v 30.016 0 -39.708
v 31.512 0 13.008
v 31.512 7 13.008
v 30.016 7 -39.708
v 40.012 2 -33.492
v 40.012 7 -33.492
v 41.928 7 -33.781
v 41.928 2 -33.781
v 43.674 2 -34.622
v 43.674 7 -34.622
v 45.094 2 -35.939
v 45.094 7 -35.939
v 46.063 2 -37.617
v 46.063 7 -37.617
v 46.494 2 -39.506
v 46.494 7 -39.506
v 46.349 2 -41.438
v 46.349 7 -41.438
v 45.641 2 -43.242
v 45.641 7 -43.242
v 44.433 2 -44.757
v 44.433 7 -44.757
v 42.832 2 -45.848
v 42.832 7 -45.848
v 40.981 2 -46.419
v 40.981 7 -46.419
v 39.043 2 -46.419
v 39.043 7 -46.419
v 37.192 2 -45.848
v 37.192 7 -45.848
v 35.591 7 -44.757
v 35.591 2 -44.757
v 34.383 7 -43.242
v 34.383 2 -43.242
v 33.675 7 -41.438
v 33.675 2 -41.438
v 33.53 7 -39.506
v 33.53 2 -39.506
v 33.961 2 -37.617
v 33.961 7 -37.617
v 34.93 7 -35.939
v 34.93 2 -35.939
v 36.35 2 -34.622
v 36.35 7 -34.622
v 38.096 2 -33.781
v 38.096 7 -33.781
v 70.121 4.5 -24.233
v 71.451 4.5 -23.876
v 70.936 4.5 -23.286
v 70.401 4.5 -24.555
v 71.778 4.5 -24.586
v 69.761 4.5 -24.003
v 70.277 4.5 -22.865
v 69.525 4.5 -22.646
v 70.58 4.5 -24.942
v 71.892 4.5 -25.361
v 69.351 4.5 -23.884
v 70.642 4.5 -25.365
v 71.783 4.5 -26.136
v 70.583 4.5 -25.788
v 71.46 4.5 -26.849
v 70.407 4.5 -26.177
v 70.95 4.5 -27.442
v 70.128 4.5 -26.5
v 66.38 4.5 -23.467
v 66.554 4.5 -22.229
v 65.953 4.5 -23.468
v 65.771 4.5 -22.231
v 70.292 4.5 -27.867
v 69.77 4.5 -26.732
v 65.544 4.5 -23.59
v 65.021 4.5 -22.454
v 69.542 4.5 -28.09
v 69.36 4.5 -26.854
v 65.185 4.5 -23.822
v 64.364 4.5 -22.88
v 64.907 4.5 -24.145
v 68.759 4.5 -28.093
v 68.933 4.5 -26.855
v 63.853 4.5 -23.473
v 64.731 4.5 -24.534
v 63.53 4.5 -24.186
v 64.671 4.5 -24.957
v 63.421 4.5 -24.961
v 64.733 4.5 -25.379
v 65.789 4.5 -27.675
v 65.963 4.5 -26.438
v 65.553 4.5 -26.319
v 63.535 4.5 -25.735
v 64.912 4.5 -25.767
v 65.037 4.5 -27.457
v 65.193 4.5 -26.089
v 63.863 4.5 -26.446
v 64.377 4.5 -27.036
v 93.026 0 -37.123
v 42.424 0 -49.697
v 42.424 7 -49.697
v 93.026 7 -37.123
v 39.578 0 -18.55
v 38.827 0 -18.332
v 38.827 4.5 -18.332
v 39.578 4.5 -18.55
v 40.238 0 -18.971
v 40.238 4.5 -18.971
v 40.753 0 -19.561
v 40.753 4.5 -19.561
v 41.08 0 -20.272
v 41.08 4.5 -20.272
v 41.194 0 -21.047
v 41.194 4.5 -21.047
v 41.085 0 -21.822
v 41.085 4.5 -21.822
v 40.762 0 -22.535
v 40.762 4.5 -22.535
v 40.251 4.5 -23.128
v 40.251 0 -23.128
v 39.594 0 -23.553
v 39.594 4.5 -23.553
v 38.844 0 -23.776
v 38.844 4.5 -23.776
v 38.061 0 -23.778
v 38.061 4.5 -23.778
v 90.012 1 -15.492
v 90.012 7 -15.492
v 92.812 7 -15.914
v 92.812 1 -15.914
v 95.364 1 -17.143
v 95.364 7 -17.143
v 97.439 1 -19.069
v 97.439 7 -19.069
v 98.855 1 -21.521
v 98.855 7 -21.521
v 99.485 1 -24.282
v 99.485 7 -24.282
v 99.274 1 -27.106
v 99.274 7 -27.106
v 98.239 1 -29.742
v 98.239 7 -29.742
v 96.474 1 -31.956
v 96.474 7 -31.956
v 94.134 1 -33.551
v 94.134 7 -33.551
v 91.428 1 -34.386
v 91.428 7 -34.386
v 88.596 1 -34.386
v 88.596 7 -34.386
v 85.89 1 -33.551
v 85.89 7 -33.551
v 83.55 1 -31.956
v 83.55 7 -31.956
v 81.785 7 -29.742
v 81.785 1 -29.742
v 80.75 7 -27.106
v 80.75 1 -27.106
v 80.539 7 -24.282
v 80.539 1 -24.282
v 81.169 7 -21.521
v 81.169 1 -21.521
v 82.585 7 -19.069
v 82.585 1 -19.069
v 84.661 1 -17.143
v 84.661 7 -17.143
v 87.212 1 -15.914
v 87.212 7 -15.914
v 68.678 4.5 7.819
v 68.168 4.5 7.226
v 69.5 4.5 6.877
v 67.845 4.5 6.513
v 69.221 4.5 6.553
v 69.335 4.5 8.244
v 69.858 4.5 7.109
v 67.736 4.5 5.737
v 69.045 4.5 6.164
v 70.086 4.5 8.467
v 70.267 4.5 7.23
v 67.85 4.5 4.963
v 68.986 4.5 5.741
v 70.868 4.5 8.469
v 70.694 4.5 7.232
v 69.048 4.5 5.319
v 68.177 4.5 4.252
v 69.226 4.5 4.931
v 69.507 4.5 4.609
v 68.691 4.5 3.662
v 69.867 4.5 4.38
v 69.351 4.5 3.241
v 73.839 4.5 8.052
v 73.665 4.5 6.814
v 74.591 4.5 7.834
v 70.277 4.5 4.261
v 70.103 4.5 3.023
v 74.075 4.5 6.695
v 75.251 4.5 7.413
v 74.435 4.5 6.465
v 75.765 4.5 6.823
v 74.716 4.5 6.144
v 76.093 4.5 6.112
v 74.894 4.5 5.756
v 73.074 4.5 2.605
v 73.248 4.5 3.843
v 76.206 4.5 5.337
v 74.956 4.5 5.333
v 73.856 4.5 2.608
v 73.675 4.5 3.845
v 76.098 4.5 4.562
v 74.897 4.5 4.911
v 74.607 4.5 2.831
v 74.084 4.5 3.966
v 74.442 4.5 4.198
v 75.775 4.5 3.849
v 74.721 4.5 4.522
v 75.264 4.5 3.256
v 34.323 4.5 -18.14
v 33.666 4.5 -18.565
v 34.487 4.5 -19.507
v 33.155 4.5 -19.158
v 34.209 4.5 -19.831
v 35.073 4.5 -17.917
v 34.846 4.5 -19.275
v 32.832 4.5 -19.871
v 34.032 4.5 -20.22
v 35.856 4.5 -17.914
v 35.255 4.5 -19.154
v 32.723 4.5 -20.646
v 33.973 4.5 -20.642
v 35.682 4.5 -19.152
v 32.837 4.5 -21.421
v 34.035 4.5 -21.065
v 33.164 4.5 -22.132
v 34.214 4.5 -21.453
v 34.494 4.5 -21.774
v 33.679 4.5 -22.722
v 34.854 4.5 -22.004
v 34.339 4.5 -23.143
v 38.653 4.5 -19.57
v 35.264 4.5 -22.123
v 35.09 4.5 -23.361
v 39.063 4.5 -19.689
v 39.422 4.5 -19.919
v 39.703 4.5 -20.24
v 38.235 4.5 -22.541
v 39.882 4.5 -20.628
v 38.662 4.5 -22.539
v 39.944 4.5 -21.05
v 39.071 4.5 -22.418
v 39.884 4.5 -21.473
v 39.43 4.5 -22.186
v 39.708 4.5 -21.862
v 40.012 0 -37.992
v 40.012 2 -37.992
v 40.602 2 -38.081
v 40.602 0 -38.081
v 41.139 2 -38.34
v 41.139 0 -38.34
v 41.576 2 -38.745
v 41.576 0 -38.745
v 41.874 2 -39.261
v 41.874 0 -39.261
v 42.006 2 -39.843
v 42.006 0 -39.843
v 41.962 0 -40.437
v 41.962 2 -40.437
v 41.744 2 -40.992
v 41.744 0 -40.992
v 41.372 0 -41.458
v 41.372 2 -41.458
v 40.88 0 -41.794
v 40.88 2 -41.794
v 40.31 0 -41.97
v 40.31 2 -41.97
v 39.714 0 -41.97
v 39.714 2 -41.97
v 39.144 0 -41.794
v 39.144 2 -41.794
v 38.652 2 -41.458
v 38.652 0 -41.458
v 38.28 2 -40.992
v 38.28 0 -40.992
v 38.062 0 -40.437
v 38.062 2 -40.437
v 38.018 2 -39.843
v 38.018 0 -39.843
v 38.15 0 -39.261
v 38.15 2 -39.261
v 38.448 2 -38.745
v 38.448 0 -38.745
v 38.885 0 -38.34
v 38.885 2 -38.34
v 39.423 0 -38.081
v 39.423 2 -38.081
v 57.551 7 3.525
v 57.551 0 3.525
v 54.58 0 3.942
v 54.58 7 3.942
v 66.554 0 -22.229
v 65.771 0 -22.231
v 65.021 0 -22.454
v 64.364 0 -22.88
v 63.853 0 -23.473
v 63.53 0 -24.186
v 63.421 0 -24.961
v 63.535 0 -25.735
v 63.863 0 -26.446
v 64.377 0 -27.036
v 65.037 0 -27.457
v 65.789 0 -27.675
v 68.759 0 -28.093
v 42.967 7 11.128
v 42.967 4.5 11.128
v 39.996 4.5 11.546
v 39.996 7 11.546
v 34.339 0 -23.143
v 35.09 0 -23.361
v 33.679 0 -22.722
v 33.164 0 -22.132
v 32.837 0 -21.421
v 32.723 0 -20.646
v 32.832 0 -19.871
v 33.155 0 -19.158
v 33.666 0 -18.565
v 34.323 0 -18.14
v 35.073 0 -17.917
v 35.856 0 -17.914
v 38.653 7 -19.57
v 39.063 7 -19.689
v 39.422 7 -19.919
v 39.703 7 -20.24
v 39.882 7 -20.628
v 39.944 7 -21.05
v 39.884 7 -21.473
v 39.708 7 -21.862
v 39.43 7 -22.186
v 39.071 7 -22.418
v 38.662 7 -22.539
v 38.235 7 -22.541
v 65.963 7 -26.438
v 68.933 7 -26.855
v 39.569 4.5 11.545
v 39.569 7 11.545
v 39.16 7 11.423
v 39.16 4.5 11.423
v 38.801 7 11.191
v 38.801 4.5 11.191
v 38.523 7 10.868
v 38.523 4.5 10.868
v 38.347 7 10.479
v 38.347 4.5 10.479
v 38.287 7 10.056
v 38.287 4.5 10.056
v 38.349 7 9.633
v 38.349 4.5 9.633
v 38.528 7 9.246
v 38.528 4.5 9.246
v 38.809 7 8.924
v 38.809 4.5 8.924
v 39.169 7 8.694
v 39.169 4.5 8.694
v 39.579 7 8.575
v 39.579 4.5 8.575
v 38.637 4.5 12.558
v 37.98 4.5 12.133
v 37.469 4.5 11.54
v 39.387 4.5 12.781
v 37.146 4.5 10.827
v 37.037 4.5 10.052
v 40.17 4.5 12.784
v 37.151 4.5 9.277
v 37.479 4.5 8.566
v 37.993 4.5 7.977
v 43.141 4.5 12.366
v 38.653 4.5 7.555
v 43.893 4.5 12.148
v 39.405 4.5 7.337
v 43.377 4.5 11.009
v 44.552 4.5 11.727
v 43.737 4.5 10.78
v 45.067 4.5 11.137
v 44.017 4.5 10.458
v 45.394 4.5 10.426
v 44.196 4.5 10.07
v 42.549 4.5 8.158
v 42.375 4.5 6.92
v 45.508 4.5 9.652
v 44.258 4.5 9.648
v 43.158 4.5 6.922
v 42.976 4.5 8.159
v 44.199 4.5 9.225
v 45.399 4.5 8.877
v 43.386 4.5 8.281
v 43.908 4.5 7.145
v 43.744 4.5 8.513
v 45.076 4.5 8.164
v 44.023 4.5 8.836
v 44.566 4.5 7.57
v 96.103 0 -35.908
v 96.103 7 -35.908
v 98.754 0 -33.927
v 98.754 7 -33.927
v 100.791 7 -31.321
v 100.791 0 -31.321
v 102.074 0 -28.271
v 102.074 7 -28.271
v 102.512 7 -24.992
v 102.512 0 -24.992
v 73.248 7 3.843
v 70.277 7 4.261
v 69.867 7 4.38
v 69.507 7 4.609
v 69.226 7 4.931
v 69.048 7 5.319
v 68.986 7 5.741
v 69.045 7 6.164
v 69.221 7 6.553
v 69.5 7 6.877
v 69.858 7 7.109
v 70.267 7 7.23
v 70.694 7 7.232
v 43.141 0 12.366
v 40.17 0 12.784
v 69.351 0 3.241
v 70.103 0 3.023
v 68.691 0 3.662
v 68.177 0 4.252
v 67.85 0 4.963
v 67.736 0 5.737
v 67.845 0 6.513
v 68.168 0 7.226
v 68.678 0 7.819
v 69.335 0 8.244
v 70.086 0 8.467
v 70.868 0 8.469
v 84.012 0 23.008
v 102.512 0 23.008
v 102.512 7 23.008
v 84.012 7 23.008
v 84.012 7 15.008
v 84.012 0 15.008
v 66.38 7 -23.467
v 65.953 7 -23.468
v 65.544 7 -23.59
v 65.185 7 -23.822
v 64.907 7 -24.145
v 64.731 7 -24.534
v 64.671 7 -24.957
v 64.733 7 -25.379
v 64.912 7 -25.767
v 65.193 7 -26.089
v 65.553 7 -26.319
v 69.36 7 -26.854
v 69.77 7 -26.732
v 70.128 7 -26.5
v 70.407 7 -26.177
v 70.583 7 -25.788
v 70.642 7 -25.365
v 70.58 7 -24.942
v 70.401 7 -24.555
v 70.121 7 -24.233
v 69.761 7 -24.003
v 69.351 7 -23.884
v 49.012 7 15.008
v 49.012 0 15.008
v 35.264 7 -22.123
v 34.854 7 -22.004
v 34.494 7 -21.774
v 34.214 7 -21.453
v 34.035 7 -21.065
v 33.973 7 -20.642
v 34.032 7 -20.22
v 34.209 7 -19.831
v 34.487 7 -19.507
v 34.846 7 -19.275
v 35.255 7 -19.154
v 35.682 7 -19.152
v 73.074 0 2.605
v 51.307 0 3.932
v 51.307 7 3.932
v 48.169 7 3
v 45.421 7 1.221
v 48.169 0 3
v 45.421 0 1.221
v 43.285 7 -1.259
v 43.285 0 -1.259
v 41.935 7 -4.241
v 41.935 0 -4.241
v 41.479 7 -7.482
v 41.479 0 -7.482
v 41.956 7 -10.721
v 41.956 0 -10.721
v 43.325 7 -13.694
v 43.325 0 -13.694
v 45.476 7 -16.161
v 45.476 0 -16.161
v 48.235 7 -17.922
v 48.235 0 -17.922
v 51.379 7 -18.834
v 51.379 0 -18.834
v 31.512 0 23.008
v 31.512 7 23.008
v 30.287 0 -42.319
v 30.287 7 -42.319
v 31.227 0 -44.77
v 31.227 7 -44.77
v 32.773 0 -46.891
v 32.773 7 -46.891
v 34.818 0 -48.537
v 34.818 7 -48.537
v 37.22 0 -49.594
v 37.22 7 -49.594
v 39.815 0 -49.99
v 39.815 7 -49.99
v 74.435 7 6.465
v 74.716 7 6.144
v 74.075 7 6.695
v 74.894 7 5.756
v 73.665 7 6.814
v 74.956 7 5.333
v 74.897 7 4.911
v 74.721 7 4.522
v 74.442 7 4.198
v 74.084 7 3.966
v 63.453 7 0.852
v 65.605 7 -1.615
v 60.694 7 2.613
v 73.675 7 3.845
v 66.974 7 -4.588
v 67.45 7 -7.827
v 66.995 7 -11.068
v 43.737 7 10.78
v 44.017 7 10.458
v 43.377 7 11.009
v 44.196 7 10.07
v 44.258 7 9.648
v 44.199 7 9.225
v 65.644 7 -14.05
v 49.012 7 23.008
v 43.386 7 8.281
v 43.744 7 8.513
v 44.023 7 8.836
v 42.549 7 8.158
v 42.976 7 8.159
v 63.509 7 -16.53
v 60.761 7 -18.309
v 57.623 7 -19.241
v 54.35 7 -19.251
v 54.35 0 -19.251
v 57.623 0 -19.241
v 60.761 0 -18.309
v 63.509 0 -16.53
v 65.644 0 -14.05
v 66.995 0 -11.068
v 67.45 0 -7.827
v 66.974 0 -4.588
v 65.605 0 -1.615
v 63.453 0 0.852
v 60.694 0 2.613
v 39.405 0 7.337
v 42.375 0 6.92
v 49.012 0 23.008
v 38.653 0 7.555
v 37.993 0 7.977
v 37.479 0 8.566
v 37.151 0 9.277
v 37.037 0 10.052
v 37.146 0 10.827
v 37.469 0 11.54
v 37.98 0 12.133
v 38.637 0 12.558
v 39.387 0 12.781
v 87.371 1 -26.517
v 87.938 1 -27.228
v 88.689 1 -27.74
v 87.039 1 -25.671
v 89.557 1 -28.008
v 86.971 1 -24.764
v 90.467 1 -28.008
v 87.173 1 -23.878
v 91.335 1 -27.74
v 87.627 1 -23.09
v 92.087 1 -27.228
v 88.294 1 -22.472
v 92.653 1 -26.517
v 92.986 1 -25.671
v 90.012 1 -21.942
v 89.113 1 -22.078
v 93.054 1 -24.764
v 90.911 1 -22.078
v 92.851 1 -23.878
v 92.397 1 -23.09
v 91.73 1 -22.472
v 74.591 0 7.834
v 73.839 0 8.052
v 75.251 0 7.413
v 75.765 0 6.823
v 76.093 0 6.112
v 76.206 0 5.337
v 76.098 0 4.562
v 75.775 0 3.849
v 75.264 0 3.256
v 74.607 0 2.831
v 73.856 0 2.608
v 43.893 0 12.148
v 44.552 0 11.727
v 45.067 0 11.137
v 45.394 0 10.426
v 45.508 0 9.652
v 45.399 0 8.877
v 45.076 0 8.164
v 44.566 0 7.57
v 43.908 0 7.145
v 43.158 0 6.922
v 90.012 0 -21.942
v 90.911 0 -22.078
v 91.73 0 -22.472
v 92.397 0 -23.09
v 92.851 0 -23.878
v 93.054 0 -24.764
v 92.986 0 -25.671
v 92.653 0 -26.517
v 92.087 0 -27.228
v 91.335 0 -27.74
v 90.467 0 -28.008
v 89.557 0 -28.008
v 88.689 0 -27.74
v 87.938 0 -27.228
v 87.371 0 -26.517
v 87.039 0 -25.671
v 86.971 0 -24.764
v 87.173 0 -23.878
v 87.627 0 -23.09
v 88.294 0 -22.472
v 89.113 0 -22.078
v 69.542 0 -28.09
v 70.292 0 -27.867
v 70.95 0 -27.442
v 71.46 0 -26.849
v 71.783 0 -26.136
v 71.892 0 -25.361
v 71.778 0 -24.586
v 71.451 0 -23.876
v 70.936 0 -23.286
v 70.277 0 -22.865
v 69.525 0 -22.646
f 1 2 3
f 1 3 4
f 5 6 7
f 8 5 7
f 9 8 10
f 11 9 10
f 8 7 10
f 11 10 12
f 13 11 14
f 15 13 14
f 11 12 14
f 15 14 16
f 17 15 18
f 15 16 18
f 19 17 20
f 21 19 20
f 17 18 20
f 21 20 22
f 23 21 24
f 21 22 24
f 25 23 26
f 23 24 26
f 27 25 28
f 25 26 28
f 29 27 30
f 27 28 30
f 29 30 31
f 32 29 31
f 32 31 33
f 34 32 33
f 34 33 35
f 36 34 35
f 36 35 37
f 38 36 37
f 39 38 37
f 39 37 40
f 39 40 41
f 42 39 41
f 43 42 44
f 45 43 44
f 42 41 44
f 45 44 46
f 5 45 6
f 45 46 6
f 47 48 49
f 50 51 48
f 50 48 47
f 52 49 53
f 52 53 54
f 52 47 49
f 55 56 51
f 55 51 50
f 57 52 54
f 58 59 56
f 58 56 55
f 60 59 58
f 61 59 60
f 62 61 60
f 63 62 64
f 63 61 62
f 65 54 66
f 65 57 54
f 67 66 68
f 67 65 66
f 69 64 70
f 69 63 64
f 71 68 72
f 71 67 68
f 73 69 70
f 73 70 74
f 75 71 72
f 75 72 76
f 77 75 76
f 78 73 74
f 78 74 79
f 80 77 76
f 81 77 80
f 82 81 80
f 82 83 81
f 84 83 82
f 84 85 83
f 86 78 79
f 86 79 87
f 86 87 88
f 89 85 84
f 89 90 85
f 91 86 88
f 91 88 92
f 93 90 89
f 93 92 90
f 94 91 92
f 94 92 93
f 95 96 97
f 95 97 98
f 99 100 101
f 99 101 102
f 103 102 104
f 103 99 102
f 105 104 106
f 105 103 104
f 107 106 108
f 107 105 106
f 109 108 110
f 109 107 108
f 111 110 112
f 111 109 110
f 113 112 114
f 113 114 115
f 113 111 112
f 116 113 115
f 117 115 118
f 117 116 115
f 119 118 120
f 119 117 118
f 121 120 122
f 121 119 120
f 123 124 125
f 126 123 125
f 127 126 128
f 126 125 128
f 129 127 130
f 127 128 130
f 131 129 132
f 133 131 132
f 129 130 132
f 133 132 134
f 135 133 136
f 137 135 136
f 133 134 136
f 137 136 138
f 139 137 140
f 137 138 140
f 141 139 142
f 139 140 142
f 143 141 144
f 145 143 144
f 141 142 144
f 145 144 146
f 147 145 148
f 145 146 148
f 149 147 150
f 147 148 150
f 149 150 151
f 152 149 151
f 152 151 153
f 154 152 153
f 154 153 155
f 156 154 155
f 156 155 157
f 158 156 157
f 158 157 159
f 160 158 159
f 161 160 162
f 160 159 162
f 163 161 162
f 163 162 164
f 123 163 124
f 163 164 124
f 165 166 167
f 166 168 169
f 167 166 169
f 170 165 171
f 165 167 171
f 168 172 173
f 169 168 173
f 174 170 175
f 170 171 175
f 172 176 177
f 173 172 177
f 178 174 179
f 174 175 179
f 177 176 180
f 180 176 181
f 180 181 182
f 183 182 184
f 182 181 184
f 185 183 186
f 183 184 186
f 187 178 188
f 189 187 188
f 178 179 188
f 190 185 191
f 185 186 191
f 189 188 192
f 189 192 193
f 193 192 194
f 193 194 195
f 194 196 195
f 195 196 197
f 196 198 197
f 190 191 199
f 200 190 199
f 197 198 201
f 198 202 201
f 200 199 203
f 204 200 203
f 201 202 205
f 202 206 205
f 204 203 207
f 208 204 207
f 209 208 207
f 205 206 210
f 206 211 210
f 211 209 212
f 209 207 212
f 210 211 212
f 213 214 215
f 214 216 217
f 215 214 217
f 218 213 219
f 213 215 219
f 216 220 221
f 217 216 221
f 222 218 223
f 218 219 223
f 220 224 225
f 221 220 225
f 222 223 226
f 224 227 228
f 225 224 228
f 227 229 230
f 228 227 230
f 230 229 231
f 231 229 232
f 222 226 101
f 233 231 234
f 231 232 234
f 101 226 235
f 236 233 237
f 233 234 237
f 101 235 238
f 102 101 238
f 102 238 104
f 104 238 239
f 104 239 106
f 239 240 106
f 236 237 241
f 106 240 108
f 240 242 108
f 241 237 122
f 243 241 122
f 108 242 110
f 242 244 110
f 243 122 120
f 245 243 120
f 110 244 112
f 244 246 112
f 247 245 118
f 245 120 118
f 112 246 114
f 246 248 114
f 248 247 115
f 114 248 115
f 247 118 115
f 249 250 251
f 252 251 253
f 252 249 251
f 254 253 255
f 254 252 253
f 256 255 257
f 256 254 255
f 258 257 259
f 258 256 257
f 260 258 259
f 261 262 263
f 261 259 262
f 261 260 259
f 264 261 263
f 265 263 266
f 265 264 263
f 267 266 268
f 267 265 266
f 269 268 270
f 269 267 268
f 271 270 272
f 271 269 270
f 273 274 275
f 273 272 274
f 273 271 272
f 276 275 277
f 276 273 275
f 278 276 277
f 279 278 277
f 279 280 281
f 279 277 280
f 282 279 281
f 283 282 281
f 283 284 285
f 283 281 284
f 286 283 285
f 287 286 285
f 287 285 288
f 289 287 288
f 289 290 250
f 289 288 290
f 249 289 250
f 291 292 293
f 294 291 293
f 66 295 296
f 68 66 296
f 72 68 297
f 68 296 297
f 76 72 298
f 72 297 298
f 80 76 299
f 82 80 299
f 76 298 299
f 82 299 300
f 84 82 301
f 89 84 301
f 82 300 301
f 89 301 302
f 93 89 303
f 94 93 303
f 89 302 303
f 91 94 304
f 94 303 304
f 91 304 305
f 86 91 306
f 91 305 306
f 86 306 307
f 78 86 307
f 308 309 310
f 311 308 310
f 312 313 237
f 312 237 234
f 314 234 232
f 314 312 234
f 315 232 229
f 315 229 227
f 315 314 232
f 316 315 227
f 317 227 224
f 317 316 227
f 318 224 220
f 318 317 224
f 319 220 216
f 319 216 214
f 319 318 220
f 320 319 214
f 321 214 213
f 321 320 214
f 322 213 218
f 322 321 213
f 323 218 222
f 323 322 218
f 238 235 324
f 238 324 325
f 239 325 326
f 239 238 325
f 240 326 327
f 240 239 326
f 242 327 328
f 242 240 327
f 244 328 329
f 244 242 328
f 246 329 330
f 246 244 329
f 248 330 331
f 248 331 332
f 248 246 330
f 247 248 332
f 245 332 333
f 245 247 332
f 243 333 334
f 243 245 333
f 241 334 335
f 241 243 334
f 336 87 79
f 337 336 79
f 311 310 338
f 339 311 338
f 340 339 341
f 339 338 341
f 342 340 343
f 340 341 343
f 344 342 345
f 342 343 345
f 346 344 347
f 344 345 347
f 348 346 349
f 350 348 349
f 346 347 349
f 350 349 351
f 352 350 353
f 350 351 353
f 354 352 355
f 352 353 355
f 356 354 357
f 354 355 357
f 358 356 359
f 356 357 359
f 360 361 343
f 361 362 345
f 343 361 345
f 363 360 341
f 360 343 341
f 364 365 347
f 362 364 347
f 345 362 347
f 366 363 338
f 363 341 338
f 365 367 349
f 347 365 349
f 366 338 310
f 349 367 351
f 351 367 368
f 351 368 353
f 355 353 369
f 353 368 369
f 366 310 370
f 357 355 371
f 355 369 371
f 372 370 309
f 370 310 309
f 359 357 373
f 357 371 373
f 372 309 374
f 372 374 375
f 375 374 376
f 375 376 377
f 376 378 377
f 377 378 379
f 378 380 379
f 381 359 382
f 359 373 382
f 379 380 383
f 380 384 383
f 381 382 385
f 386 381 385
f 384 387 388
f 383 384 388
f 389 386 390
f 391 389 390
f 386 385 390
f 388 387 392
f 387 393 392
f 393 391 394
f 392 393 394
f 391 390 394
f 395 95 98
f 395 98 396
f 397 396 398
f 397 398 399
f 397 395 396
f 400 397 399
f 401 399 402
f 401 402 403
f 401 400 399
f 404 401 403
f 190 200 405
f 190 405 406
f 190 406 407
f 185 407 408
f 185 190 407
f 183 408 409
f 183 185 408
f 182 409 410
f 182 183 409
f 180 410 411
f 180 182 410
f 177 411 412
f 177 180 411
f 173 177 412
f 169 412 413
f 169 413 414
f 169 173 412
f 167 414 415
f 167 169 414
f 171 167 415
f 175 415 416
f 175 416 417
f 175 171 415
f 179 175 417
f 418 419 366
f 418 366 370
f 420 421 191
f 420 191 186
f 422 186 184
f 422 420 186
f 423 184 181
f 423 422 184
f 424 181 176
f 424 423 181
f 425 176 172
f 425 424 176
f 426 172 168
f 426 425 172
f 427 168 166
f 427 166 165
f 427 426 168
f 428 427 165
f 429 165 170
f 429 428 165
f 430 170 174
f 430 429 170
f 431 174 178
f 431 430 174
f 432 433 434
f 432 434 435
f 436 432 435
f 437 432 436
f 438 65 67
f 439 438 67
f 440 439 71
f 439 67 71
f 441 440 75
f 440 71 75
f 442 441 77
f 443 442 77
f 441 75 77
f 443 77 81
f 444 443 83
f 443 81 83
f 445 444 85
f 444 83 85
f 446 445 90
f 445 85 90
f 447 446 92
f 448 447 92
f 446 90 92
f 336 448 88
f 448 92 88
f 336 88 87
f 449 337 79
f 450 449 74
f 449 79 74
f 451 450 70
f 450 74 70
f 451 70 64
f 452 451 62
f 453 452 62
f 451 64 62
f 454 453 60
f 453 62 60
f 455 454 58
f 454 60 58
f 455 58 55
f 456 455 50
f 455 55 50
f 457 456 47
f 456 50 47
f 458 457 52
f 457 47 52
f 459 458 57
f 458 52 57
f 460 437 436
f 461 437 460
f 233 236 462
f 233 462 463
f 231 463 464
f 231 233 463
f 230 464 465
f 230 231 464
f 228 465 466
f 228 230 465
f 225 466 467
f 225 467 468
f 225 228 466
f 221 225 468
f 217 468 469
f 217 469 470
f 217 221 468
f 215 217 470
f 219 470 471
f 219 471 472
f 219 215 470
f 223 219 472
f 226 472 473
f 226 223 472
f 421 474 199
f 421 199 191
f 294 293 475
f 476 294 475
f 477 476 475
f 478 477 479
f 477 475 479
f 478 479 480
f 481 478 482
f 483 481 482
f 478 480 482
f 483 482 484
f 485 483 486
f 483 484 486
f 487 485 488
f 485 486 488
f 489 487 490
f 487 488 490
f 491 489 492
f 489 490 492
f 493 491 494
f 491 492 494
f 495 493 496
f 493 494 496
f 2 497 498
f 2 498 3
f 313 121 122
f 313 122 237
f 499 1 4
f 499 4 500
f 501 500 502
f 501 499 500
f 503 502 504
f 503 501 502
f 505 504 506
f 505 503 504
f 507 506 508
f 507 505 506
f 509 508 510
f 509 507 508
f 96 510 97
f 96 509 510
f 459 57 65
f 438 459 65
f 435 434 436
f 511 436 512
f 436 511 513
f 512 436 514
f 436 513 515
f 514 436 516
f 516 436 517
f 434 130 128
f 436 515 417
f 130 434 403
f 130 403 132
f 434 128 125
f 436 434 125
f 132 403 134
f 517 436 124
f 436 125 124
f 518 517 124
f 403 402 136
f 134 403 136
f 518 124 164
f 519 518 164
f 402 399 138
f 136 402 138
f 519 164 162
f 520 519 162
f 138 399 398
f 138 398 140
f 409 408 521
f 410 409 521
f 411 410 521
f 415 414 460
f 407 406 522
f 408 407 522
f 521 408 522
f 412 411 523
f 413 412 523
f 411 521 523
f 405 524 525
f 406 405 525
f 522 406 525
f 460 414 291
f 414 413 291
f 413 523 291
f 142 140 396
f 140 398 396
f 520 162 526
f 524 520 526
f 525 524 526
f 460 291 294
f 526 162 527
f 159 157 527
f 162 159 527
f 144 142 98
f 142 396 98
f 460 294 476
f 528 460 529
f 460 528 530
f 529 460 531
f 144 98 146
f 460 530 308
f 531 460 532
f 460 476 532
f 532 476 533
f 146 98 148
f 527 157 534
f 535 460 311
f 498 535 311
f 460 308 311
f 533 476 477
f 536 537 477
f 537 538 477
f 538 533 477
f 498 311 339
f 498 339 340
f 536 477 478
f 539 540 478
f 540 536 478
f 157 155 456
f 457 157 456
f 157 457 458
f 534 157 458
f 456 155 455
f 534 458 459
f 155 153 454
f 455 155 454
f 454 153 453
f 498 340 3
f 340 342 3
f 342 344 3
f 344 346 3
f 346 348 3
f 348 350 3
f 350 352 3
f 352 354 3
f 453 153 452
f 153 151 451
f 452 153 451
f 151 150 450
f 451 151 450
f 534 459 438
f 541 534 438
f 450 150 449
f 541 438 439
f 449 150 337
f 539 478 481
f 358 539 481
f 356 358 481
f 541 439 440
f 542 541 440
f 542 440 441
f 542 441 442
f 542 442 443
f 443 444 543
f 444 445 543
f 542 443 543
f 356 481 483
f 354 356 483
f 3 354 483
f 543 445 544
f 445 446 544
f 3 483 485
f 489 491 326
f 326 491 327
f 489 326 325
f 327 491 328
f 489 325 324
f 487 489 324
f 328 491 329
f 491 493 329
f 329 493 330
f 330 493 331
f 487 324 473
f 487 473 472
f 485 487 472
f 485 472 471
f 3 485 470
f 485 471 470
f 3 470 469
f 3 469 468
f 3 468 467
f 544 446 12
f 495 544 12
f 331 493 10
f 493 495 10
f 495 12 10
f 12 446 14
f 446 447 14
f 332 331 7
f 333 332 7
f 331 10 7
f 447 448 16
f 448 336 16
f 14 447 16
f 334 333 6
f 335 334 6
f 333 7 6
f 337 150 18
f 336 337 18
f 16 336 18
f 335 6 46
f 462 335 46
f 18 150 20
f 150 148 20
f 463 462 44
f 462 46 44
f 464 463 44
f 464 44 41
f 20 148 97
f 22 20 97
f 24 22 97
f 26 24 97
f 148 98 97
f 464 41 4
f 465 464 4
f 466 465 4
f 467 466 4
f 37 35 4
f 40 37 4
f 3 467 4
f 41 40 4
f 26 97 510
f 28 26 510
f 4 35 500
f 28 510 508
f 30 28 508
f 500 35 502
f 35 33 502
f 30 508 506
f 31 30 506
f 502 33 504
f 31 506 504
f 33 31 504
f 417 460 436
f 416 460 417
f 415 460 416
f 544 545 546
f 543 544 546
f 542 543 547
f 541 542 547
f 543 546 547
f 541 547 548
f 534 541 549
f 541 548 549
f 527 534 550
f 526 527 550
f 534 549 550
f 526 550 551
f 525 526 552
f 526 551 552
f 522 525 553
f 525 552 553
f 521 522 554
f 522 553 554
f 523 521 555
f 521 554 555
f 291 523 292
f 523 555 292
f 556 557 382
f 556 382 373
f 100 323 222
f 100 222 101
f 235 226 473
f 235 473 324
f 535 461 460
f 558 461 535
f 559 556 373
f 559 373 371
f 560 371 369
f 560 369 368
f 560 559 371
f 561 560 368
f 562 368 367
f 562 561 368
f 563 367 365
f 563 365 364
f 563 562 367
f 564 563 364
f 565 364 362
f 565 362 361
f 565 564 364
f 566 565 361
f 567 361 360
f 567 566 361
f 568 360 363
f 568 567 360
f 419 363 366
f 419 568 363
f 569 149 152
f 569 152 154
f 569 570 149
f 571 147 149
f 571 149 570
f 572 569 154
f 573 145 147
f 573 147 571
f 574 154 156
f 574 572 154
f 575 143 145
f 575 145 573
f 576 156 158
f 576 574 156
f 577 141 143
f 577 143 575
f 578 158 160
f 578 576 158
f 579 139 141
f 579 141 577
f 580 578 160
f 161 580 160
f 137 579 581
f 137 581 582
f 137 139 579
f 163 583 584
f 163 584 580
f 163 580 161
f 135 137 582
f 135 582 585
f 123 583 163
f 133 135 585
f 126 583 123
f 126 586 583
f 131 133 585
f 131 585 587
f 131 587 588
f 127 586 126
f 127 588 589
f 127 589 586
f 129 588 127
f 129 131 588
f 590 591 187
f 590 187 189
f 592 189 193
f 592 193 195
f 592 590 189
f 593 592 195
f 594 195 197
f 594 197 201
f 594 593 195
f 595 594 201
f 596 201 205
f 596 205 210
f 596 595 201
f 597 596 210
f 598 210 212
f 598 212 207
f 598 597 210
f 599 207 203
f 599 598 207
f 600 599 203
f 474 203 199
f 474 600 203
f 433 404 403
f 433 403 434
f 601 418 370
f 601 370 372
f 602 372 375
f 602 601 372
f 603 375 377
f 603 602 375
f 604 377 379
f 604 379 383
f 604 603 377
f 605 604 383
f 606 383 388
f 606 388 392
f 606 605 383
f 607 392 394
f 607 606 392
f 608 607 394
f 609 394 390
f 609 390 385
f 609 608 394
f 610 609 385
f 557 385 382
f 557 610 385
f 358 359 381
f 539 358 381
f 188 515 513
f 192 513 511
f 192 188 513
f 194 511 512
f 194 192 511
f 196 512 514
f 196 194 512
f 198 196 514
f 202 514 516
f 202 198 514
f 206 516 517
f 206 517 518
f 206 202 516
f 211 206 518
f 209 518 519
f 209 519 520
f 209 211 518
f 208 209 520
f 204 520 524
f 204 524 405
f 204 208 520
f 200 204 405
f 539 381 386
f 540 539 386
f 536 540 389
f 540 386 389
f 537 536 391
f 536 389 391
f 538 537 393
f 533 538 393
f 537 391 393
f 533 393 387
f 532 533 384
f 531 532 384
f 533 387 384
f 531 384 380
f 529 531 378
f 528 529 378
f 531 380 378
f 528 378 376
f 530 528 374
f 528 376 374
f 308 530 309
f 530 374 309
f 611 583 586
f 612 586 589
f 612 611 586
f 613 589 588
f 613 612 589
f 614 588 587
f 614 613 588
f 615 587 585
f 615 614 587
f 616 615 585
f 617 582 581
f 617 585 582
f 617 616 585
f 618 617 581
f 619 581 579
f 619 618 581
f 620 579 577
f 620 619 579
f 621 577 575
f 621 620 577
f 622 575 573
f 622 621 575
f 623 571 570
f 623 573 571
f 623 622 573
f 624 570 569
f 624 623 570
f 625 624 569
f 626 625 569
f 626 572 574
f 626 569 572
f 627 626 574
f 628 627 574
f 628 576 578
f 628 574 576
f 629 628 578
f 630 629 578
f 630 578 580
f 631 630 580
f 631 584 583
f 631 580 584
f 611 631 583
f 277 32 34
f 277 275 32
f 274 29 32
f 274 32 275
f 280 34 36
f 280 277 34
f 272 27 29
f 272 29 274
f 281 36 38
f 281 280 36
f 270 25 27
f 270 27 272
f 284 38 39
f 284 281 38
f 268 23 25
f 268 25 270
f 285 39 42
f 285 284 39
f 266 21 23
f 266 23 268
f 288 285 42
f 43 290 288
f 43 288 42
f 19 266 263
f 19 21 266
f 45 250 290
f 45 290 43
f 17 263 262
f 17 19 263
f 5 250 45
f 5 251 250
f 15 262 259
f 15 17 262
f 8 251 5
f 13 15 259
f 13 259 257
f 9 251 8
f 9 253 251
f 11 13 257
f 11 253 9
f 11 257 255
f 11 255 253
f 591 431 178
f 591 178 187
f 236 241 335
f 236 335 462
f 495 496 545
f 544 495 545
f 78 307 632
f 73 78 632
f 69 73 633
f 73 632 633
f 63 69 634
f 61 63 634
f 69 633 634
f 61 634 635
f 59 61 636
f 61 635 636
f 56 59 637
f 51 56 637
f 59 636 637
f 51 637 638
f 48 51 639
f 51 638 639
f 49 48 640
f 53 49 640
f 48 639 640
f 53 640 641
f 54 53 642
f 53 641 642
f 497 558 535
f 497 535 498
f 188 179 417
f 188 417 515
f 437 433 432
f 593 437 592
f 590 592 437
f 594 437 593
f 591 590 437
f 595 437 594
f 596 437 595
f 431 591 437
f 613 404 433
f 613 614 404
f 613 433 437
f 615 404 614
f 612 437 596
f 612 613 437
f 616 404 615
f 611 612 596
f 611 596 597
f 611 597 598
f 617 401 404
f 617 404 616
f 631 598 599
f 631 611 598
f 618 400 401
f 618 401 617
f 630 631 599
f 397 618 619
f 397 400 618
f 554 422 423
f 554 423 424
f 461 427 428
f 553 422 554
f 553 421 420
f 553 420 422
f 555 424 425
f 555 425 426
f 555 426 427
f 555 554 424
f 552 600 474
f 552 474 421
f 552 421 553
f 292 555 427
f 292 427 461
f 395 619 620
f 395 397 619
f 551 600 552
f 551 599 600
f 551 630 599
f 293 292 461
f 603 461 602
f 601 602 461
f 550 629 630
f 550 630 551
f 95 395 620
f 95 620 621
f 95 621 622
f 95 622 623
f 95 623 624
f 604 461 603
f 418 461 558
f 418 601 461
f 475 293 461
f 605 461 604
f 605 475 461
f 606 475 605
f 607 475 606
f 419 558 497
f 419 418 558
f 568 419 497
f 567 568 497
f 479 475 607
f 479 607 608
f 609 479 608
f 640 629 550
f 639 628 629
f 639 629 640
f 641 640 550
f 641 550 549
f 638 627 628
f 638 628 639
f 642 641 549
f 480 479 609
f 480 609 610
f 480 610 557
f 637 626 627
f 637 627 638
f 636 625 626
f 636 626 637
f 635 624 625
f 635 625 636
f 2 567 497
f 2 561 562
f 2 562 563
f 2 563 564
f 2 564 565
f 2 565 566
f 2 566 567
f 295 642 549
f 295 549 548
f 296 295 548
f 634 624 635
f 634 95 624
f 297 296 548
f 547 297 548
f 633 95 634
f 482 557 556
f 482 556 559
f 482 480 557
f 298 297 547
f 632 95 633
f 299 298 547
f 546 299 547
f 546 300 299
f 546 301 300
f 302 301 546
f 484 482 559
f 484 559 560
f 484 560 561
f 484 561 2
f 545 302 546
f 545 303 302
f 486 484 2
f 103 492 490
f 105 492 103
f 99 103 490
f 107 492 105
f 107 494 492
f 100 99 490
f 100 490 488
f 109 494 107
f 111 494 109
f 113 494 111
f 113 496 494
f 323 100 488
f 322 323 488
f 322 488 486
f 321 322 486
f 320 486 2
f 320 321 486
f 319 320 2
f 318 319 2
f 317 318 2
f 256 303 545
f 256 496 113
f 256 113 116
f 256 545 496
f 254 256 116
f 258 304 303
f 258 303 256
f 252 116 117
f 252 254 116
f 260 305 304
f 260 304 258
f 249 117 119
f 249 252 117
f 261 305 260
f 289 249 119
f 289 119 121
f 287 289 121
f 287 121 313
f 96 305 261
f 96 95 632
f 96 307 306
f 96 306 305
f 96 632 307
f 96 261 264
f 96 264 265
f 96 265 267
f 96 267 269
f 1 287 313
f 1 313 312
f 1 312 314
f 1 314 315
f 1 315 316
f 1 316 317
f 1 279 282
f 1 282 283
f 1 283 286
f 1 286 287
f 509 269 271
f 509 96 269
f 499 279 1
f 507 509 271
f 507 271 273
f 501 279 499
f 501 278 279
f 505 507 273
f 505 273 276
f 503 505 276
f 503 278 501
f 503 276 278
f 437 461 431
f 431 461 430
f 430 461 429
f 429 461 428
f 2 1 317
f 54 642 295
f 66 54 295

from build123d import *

# Parameters (mm, degrees)
SKETCH2_R           = 3.05
SKETCH2_R_2         = 2
BOSS_EXTRUDE1_DEPTH = 7
CUT_EXTRUDE1_START  = 7
SKETCH2_4_R         = 9.5
CUT_EXTRUDE1_DEPTH  = 6
CUT_EXTRUDE2_START  = 7
SKETCH2_5_R         = 6.5
CUT_EXTRUDE2_DEPTH  = 5
CUT_EXTRUDE3_DEPTH  = 4.5


with BuildPart() as part:
    # Sketch2 → Boss-Extrude1 (new body)
    with BuildSketch(Plane(origin=(0, 0, 0), x_dir=(1, 0, 0), z_dir=(0, 1, 0))):
        with BuildLine():
            Line((102.512048312, 24.992099408), (102.512048312, -23.007900592))
            Line((102.512048312, -23.007900592), (84.012048312, -23.007900592))
            Line((84.012048312, -23.007900592), (84.012048312, -15.007900592))
            Line((84.012048312, -15.007900592), (49.012048312, -15.007900592))
            Line((49.012048312, -15.007900592), (49.012048312, -23.007900592))
            Line((49.012048312, -23.007900592), (31.512048312, -23.007900592))
            Line((31.512048312, -23.007900592), (31.512048312, -13.007900592))
            Line((31.512048312, -13.007900592), (30.016072392, 39.708435169))
            ThreePointArc((30.016072392, 39.708435169), (33.741164308, 47.78158038), (42.423514406, 49.696986387))
            Line((42.423514406, 49.696986387), (93.026380929, 37.123208132))
            ThreePointArc((93.026380929, 37.123208132), (99.859107713, 32.691802074), (102.512048312, 24.992099408))
        make_face()
        with Locations(Location((90.012048312, 24.992099408, 0), (0, 0, 270))):
            Circle(SKETCH2_R, mode=Mode.SUBTRACT)
        with Locations(Location((40.012048312, 39.992099408, 0), (0, 0, 270))):
            Circle(SKETCH2_R_2, mode=Mode.SUBTRACT)
        with BuildLine():
            Line((51.378851017, 18.833843692), (54.349655223, 19.251362995))
            ThreePointArc((54.349655223, 19.251362995), (67.338228674, 9.463770865), (57.550636545, -3.524802586))
            Line((57.550636545, -3.524802586), (54.579832339, -3.942321889))
            ThreePointArc((54.579832339, -3.942321889), (41.591258887, 5.84527024), (51.378851017, 18.833843692))
        make_face(mode=Mode.SUBTRACT)
        with BuildLine():
            Line((65.962554027, 26.437501135), (68.933358233, 26.855020438))
            ThreePointArc((68.933358233, 26.855020438), (70.627519988, 25.578377986), (69.350877536, 23.884216232))
            Line((69.350877536, 23.884216232), (66.38007333, 23.466696929))
            ThreePointArc((66.38007333, 23.466696929), (64.685911575, 24.74333938), (65.962554027, 26.437501135))
        make_face(mode=Mode.SUBTRACT)
        with BuildLine():
            Line((70.694439459, -7.231613202), (73.665243666, -6.814093899))
            ThreePointArc((73.665243666, -6.814093899), (74.941886117, -5.119932145), (73.247724363, -3.843289693))
            Line((73.247724363, -3.843289693), (70.276920157, -4.260808996))
            ThreePointArc((70.276920157, -4.260808996), (69.000277705, -5.954970751), (70.694439459, -7.231613202))
        make_face(mode=Mode.SUBTRACT)
        with BuildLine():
            Line((42.966933535, -11.128460029), (39.996129329, -11.545979332))
            ThreePointArc((39.996129329, -11.545979332), (38.301967574, -10.26933688), (39.578610026, -8.575175126))
            Line((39.578610026, -8.575175126), (42.549414232, -8.157655823))
            ThreePointArc((42.549414232, -8.157655823), (44.243575986, -9.434298275), (42.966933535, -11.128460029))
        make_face(mode=Mode.SUBTRACT)
        with BuildLine():
            Line((38.235048102, 22.540654308), (35.264243896, 22.123135005))
            ThreePointArc((35.264243896, 22.123135005), (33.987601444, 20.428973251), (35.681763199, 19.152330799))
            Line((35.681763199, 19.152330799), (38.652567405, 19.569850102))
            ThreePointArc((38.652567405, 19.569850102), (39.929209857, 21.264011856), (38.235048102, 22.540654308))
        make_face(mode=Mode.SUBTRACT)
    extrude(amount=BOSS_EXTRUDE1_DEPTH)

    # Sketch2<4> → Cut-Extrude1 (cut)
    with BuildSketch(Plane(origin=(0, 0, 0), x_dir=(1, 0, 0), z_dir=(0, 1, 0)).offset(CUT_EXTRUDE1_START)):
        with Locations(Location((90.012048312, 24.992099408, 0), (0, 0, 270))):
            Circle(SKETCH2_4_R)
    extrude(amount=-CUT_EXTRUDE1_DEPTH, mode=Mode.SUBTRACT)

    # Sketch2<5> → Cut-Extrude2 (cut)
    with BuildSketch(Plane(origin=(0, 0, 0), x_dir=(1, 0, 0), z_dir=(0, 1, 0)).offset(CUT_EXTRUDE2_START)):
        with Locations(Location((40.012048312, 39.992099408, 0), (0, 0, 270))):
            Circle(SKETCH2_5_R)
    extrude(amount=-CUT_EXTRUDE2_DEPTH, mode=Mode.SUBTRACT)

    # Sketch2<6> → Cut-Extrude3 (cut)
    with BuildSketch(Plane(origin=(0, 0, 0), x_dir=(1, 0, 0), z_dir=(0, 1, 0))):
        with BuildLine():
            Line((65.788587651, 27.675336221), (68.759391857, 28.092855524))
            ThreePointArc((68.759391857, 28.092855524), (71.865355074, 25.752344362), (69.524843912, 22.646381146))
            Line((69.524843912, 22.646381146), (66.554039706, 22.228861843))
            ThreePointArc((66.554039706, 22.228861843), (63.448076489, 24.569373004), (65.788587651, 27.675336221))
        make_face()
        with BuildLine():
            Line((70.868405836, -8.469448288), (73.839210042, -8.051928985))
            ThreePointArc((73.839210042, -8.051928985), (76.179721203, -4.945965769), (73.073757987, -2.605454607))
            Line((73.073757987, -2.605454607), (70.10295378, -3.02297391))
            ThreePointArc((70.10295378, -3.02297391), (67.762442619, -6.128937127), (70.868405836, -8.469448288))
        make_face()
        with BuildLine():
            Line((38.061081726, 23.778489394), (35.09027752, 23.360970091))
            ThreePointArc((35.09027752, 23.360970091), (32.749766358, 20.255006874), (35.855729575, 17.914495713))
            Line((35.855729575, 17.914495713), (38.826533781, 18.332015016))
            ThreePointArc((38.826533781, 18.332015016), (41.167044943, 21.437978232), (38.061081726, 23.778489394))
        make_face()
        with BuildLine():
            Line((42.375447856, -6.919820737), (39.404643649, -7.33734004))
            ThreePointArc((39.404643649, -7.33734004), (37.064132488, -10.443303257), (40.170095705, -12.783814418))
            Line((40.170095705, -12.783814418), (43.140899911, -12.366295115))
            ThreePointArc((43.140899911, -12.366295115), (45.481411072, -9.260331898), (42.375447856, -6.919820737))
        make_face()
    extrude(amount=CUT_EXTRUDE3_DEPTH, mode=Mode.SUBTRACT)


solid = part.part
